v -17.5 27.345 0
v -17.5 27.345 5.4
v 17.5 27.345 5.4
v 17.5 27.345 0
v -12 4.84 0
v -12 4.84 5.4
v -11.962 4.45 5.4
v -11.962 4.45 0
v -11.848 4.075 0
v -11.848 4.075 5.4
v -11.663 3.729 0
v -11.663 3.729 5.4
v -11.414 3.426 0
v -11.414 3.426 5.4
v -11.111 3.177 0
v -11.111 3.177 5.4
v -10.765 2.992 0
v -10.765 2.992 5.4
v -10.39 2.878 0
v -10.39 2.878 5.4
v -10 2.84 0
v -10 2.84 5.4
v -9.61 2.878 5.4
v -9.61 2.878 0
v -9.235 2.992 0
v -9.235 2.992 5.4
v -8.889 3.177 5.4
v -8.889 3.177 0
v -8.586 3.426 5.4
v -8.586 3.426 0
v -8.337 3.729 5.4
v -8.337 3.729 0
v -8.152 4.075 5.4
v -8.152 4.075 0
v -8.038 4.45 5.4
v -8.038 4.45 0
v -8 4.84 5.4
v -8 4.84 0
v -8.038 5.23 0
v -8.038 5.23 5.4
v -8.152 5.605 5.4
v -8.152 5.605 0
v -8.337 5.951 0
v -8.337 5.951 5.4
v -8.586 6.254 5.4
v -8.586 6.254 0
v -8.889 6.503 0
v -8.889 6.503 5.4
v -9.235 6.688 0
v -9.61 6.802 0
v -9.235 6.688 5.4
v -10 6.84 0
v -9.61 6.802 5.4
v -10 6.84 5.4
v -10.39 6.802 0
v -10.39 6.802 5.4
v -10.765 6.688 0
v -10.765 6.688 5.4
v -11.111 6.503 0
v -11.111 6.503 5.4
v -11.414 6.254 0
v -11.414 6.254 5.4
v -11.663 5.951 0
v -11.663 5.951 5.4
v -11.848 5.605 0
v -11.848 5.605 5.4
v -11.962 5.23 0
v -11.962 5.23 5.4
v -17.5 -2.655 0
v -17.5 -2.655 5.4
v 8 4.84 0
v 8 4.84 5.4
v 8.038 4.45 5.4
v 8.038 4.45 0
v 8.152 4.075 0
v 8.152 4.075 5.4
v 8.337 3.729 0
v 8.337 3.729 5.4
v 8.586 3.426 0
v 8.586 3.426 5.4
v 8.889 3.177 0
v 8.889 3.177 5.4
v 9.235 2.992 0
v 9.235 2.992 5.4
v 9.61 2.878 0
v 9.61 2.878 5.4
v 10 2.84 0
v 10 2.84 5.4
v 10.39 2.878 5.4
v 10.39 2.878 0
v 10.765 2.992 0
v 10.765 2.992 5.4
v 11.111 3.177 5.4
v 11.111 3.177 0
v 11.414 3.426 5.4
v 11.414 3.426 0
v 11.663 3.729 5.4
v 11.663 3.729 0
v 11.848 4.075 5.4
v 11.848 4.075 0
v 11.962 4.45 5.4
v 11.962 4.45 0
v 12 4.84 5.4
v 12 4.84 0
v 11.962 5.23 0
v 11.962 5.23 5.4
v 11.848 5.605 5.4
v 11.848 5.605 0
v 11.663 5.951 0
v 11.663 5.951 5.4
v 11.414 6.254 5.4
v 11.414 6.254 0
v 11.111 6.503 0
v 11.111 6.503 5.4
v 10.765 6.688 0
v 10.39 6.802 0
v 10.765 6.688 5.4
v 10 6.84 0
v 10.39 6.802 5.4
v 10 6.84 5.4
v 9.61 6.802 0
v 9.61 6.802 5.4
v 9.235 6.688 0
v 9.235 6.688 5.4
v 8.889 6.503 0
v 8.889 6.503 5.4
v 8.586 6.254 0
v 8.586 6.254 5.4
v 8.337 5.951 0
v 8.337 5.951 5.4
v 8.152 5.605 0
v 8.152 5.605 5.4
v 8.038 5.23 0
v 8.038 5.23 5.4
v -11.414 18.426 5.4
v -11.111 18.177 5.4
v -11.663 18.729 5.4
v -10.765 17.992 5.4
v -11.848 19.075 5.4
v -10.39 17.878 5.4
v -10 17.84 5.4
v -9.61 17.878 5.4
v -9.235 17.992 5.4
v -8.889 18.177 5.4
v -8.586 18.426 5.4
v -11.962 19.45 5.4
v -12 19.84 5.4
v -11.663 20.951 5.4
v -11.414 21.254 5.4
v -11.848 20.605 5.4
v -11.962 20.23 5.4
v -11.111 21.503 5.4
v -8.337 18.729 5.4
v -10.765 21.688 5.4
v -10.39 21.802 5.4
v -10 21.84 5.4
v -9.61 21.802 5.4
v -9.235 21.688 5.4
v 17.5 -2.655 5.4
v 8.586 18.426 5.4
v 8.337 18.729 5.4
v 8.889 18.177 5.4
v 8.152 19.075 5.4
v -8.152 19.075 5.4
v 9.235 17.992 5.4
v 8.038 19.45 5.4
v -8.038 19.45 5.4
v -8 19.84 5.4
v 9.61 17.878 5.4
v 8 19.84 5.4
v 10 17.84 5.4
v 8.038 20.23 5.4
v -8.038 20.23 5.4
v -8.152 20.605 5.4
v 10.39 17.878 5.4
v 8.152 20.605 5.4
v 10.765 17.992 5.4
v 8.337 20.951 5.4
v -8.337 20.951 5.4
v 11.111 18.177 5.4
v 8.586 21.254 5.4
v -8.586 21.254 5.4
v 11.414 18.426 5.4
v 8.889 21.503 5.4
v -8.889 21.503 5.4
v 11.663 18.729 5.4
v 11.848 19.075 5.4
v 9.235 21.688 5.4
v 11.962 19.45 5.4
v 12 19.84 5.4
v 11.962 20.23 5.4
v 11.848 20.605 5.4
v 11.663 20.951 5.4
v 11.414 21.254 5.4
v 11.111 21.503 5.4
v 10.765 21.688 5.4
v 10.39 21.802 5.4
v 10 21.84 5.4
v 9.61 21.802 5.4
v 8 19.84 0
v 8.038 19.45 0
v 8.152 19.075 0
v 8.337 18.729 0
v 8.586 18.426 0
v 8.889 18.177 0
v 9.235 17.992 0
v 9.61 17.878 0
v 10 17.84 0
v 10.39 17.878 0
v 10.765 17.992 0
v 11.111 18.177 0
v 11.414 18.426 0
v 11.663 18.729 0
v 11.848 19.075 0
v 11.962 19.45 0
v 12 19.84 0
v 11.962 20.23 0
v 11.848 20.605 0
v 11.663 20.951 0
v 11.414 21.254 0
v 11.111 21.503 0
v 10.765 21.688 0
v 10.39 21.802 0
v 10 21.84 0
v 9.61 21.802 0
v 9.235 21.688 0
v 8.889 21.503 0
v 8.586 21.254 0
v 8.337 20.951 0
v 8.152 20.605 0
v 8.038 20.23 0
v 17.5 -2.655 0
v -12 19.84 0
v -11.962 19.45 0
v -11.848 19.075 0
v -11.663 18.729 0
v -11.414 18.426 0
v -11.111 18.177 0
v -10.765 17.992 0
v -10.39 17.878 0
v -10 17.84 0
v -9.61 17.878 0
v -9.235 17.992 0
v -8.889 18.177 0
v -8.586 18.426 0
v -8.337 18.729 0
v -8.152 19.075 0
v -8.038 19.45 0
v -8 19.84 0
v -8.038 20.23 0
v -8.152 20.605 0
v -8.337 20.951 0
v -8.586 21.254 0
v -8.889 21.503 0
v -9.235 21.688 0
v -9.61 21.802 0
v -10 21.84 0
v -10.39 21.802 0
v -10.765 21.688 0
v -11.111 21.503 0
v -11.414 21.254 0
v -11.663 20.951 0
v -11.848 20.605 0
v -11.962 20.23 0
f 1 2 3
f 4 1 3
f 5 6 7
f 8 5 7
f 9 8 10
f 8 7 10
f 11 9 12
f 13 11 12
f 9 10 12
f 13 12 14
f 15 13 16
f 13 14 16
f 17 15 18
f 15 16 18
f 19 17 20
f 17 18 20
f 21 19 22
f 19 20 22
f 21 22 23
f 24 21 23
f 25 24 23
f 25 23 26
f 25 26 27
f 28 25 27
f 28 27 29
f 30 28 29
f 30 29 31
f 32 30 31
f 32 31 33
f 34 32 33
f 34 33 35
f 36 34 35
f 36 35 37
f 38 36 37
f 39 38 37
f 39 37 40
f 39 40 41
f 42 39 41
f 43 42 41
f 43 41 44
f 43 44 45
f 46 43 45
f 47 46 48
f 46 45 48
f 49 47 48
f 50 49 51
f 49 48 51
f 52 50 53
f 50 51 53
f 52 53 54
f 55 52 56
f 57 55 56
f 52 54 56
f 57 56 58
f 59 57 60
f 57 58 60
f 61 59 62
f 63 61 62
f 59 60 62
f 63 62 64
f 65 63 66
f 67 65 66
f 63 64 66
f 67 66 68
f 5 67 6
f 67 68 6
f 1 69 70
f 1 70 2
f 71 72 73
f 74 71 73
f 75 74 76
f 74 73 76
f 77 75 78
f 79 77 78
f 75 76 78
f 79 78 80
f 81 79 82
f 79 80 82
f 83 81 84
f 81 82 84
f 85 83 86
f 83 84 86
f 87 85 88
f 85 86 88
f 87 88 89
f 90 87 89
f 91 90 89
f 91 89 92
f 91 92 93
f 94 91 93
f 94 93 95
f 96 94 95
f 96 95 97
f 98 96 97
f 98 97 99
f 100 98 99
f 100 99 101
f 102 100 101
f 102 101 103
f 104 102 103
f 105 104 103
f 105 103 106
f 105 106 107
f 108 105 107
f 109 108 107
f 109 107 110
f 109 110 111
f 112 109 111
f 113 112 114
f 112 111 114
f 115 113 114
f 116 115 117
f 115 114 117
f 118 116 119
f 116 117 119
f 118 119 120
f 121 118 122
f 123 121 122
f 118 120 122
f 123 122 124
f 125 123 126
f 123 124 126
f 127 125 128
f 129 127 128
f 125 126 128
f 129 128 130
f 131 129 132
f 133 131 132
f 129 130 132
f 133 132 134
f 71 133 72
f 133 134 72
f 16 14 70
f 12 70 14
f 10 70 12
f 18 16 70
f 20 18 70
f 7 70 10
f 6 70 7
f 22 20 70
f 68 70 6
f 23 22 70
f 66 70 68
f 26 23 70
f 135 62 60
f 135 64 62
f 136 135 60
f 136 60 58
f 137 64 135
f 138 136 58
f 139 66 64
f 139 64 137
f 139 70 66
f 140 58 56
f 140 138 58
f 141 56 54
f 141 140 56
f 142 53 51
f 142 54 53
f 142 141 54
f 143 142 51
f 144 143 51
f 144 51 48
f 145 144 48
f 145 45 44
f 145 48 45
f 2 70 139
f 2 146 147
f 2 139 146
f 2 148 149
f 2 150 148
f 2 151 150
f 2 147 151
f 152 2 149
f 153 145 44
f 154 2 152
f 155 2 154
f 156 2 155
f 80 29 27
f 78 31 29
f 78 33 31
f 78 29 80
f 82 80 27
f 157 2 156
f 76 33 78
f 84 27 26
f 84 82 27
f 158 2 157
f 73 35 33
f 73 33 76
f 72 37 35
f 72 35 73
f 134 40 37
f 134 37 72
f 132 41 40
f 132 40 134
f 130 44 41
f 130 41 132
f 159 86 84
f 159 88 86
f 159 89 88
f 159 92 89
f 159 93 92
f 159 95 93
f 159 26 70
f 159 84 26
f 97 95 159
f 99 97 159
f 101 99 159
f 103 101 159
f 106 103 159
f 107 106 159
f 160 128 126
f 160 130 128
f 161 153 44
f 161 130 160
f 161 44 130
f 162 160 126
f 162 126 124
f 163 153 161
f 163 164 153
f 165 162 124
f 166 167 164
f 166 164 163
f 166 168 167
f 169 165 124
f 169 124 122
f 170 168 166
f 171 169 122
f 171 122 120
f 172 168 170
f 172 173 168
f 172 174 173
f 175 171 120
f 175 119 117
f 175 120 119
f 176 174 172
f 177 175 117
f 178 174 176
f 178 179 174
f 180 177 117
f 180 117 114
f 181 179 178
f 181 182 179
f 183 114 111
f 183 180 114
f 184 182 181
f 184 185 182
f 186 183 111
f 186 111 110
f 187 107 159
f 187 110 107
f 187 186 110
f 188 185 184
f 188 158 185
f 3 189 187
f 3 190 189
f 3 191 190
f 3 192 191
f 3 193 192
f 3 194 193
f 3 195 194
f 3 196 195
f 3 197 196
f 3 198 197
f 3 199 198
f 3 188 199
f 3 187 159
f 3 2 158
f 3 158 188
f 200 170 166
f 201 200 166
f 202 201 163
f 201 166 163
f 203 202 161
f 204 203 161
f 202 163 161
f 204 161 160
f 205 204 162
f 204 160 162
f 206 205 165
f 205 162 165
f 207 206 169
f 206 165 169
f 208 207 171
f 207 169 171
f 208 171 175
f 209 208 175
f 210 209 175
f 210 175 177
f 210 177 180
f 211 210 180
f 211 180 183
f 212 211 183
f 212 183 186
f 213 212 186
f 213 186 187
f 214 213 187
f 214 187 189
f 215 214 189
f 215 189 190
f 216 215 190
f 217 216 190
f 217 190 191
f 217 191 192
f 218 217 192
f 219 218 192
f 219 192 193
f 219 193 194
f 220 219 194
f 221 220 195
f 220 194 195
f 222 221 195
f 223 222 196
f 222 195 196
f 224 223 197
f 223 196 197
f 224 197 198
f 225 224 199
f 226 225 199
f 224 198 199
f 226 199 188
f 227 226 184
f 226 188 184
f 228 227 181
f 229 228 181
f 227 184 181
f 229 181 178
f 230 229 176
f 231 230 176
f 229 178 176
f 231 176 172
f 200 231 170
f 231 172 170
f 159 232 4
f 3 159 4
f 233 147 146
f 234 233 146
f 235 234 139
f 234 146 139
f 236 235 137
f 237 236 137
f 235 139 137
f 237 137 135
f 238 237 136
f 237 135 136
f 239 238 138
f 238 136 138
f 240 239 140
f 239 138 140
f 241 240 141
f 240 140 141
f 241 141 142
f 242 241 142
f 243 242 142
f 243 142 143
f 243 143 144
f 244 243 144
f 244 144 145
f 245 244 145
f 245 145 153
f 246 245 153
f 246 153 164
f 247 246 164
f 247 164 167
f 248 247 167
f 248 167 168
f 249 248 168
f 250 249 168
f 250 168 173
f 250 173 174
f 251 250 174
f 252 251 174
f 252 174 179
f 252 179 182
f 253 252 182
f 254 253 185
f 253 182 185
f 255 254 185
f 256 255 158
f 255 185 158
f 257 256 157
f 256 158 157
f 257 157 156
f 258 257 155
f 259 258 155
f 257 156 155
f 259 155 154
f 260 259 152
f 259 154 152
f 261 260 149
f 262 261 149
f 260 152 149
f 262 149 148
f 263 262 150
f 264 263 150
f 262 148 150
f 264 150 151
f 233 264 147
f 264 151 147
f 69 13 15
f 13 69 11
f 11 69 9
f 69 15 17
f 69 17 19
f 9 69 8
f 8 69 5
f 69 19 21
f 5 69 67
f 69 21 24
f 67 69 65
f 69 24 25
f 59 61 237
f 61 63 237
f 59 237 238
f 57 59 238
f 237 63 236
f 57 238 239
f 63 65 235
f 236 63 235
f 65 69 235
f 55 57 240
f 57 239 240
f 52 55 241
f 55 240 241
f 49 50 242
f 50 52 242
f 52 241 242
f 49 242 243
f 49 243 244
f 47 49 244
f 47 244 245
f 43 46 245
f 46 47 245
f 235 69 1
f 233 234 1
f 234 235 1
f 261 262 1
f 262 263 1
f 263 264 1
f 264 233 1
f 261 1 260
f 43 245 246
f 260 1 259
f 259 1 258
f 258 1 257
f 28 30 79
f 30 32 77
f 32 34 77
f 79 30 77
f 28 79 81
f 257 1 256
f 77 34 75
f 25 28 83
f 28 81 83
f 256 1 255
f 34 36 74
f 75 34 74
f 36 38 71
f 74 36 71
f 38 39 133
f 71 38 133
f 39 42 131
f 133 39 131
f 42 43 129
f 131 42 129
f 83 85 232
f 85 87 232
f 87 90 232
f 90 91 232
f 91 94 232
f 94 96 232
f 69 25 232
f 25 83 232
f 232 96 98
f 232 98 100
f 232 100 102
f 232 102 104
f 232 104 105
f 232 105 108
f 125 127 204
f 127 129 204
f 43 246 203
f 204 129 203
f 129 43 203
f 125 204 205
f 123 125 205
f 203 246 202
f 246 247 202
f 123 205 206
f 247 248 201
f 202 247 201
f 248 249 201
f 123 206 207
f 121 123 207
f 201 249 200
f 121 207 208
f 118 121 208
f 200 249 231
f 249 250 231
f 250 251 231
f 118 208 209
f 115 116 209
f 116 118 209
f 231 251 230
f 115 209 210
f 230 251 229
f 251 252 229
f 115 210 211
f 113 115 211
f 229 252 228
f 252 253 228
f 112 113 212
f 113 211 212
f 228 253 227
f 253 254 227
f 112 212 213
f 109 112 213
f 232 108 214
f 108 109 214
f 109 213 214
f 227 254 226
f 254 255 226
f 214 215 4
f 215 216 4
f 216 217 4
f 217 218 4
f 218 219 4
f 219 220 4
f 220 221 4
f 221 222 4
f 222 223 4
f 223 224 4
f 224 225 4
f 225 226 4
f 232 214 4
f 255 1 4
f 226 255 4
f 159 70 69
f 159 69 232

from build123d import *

# Parameters (mm, degrees)
SKETCH1_W                      = 35
SKETCH1_H                      = 60
BOSS_EXTRUDE1_DEPTH            = 5.4
CUT_EXTRUDE1_REACH             = 37.148
SKETCH2_W                      = 35
SKETCH2_H                      = 2.655
SKETCH2_R                      = 2
SKETCH2_H_2                    = 17.637243623
SKETCH2_H_3                    = 9.707756377
CUT_EXTRUDE1_DIRECTION_2_DEPTH = 36.148399679


with BuildPart() as part:
    # Sketch1 → Boss-Extrude1 (new body)
    with BuildSketch(Plane.XY):
        Rectangle(SKETCH1_W, SKETCH1_H)
    extrude(amount=BOSS_EXTRUDE1_DEPTH)

    # Sketch2 → Cut-Extrude1 (cut, up to next)
    with BuildSketch(Plane.XY.offset(5.4), mode=Mode.PRIVATE) as cut_extrude1_sk1:
        with Locations((0, 28.6725)):
            Rectangle(SKETCH2_W, SKETCH2_H)
    cut_extrude1_tool1 = extrude(cut_extrude1_sk1.sketch, amount=-CUT_EXTRUDE1_REACH, mode=Mode.PRIVATE) & part.part
    # Sketch2 → Cut-Extrude1 (cut, up to next)
    with BuildSketch(Plane.XY.offset(5.4), mode=Mode.PRIVATE) as cut_extrude1_sk2:
        with Locations(Location((-10, 19.84, 0), (0, 0, 180))):
            Circle(SKETCH2_R)
    cut_extrude1_tool2 = extrude(cut_extrude1_sk2.sketch, amount=-CUT_EXTRUDE1_REACH, mode=Mode.PRIVATE) & part.part
    # Sketch2 → Cut-Extrude1 (cut, up to next)
    with BuildSketch(Plane.XY.offset(5.4), mode=Mode.PRIVATE) as cut_extrude1_sk3:
        with Locations(Location((10, 19.84, 0), (0, 0, 180))):
            Circle(SKETCH2_R)
    cut_extrude1_tool3 = extrude(cut_extrude1_sk3.sketch, amount=-CUT_EXTRUDE1_REACH, mode=Mode.PRIVATE) & part.part
    # Sketch2 → Cut-Extrude1 (cut, up to next)
    with BuildSketch(Plane.XY.offset(5.4), mode=Mode.PRIVATE) as cut_extrude1_sk4:
        with Locations(Location((-10, 4.84, 0), (0, 0, 180))):
            Circle(SKETCH2_R)
    cut_extrude1_tool4 = extrude(cut_extrude1_sk4.sketch, amount=-CUT_EXTRUDE1_REACH, mode=Mode.PRIVATE) & part.part
    # Sketch2 → Cut-Extrude1 (cut, up to next)
    with BuildSketch(Plane.XY.offset(5.4), mode=Mode.PRIVATE) as cut_extrude1_sk5:
        with Locations(Location((10, 4.84, 0), (0, 0, 180))):
            Circle(SKETCH2_R)
    cut_extrude1_tool5 = extrude(cut_extrude1_sk5.sketch, amount=-CUT_EXTRUDE1_REACH, mode=Mode.PRIVATE) & part.part
    # Sketch2 → Cut-Extrude1 (cut, up to next)
    with BuildSketch(Plane.XY.offset(5.4), mode=Mode.PRIVATE) as cut_extrude1_sk6:
        with Locations((0, -11.473621812)):
            Rectangle(SKETCH2_W, SKETCH2_H_2)
    cut_extrude1_tool6 = extrude(cut_extrude1_sk6.sketch, amount=-CUT_EXTRUDE1_REACH, mode=Mode.PRIVATE) & part.part
    # Sketch2 → Cut-Extrude1 (cut, up to next)
    with BuildSketch(Plane.XY.offset(5.4), mode=Mode.PRIVATE) as cut_extrude1_sk7:
        with Locations((0, -25.146121812)):
            Rectangle(SKETCH2_W, SKETCH2_H_3)
    cut_extrude1_tool7 = extrude(cut_extrude1_sk7.sketch, amount=-CUT_EXTRUDE1_REACH, mode=Mode.PRIVATE) & part.part
    add(cut_extrude1_tool1.solids().sort_by_distance((0, 28.6725, 5.4))[0], mode=Mode.SUBTRACT)
    add(cut_extrude1_tool2.solids().sort_by_distance((-10, 19.84, 5.4))[0], mode=Mode.SUBTRACT)
    add(cut_extrude1_tool3.solids().sort_by_distance((10, 19.84, 5.4))[0], mode=Mode.SUBTRACT)
    add(cut_extrude1_tool4.solids().sort_by_distance((-10, 4.84, 5.4))[0], mode=Mode.SUBTRACT)
    add(cut_extrude1_tool5.solids().sort_by_distance((10, 4.84, 5.4))[0], mode=Mode.SUBTRACT)
    add(cut_extrude1_tool6.solids().sort_by_distance((0, -11.473622, 5.4))[0], mode=Mode.SUBTRACT)
    add(cut_extrude1_tool7.solids().sort_by_distance((0, -25.146122, 5.4))[0], mode=Mode.SUBTRACT)

    # Sketch2 → Cut-Extrude1 direction 2 (cut)
    with BuildSketch(Plane.XY.offset(5.4)):
        with Locations((0, 28.6725)):
            Rectangle(SKETCH2_W, SKETCH2_H)
        with Locations(Location((-10, 19.84, 0), (0, 0, 180))):
            Circle(SKETCH2_R)
        with Locations(Location((10, 19.84, 0), (0, 0, 180))):
            Circle(SKETCH2_R)
        with Locations(Location((-10, 4.84, 0), (0, 0, 180))):
            Circle(SKETCH2_R)
        with Locations(Location((10, 4.84, 0), (0, 0, 180))):
            Circle(SKETCH2_R)
        with Locations((0, -11.473621812)):
            Rectangle(SKETCH2_W, SKETCH2_H_2)
        with Locations((0, -25.146121812)):
            Rectangle(SKETCH2_W, SKETCH2_H_3)
    extrude(amount=CUT_EXTRUDE1_DIRECTION_2_DEPTH, mode=Mode.SUBTRACT)


solid = part.part
